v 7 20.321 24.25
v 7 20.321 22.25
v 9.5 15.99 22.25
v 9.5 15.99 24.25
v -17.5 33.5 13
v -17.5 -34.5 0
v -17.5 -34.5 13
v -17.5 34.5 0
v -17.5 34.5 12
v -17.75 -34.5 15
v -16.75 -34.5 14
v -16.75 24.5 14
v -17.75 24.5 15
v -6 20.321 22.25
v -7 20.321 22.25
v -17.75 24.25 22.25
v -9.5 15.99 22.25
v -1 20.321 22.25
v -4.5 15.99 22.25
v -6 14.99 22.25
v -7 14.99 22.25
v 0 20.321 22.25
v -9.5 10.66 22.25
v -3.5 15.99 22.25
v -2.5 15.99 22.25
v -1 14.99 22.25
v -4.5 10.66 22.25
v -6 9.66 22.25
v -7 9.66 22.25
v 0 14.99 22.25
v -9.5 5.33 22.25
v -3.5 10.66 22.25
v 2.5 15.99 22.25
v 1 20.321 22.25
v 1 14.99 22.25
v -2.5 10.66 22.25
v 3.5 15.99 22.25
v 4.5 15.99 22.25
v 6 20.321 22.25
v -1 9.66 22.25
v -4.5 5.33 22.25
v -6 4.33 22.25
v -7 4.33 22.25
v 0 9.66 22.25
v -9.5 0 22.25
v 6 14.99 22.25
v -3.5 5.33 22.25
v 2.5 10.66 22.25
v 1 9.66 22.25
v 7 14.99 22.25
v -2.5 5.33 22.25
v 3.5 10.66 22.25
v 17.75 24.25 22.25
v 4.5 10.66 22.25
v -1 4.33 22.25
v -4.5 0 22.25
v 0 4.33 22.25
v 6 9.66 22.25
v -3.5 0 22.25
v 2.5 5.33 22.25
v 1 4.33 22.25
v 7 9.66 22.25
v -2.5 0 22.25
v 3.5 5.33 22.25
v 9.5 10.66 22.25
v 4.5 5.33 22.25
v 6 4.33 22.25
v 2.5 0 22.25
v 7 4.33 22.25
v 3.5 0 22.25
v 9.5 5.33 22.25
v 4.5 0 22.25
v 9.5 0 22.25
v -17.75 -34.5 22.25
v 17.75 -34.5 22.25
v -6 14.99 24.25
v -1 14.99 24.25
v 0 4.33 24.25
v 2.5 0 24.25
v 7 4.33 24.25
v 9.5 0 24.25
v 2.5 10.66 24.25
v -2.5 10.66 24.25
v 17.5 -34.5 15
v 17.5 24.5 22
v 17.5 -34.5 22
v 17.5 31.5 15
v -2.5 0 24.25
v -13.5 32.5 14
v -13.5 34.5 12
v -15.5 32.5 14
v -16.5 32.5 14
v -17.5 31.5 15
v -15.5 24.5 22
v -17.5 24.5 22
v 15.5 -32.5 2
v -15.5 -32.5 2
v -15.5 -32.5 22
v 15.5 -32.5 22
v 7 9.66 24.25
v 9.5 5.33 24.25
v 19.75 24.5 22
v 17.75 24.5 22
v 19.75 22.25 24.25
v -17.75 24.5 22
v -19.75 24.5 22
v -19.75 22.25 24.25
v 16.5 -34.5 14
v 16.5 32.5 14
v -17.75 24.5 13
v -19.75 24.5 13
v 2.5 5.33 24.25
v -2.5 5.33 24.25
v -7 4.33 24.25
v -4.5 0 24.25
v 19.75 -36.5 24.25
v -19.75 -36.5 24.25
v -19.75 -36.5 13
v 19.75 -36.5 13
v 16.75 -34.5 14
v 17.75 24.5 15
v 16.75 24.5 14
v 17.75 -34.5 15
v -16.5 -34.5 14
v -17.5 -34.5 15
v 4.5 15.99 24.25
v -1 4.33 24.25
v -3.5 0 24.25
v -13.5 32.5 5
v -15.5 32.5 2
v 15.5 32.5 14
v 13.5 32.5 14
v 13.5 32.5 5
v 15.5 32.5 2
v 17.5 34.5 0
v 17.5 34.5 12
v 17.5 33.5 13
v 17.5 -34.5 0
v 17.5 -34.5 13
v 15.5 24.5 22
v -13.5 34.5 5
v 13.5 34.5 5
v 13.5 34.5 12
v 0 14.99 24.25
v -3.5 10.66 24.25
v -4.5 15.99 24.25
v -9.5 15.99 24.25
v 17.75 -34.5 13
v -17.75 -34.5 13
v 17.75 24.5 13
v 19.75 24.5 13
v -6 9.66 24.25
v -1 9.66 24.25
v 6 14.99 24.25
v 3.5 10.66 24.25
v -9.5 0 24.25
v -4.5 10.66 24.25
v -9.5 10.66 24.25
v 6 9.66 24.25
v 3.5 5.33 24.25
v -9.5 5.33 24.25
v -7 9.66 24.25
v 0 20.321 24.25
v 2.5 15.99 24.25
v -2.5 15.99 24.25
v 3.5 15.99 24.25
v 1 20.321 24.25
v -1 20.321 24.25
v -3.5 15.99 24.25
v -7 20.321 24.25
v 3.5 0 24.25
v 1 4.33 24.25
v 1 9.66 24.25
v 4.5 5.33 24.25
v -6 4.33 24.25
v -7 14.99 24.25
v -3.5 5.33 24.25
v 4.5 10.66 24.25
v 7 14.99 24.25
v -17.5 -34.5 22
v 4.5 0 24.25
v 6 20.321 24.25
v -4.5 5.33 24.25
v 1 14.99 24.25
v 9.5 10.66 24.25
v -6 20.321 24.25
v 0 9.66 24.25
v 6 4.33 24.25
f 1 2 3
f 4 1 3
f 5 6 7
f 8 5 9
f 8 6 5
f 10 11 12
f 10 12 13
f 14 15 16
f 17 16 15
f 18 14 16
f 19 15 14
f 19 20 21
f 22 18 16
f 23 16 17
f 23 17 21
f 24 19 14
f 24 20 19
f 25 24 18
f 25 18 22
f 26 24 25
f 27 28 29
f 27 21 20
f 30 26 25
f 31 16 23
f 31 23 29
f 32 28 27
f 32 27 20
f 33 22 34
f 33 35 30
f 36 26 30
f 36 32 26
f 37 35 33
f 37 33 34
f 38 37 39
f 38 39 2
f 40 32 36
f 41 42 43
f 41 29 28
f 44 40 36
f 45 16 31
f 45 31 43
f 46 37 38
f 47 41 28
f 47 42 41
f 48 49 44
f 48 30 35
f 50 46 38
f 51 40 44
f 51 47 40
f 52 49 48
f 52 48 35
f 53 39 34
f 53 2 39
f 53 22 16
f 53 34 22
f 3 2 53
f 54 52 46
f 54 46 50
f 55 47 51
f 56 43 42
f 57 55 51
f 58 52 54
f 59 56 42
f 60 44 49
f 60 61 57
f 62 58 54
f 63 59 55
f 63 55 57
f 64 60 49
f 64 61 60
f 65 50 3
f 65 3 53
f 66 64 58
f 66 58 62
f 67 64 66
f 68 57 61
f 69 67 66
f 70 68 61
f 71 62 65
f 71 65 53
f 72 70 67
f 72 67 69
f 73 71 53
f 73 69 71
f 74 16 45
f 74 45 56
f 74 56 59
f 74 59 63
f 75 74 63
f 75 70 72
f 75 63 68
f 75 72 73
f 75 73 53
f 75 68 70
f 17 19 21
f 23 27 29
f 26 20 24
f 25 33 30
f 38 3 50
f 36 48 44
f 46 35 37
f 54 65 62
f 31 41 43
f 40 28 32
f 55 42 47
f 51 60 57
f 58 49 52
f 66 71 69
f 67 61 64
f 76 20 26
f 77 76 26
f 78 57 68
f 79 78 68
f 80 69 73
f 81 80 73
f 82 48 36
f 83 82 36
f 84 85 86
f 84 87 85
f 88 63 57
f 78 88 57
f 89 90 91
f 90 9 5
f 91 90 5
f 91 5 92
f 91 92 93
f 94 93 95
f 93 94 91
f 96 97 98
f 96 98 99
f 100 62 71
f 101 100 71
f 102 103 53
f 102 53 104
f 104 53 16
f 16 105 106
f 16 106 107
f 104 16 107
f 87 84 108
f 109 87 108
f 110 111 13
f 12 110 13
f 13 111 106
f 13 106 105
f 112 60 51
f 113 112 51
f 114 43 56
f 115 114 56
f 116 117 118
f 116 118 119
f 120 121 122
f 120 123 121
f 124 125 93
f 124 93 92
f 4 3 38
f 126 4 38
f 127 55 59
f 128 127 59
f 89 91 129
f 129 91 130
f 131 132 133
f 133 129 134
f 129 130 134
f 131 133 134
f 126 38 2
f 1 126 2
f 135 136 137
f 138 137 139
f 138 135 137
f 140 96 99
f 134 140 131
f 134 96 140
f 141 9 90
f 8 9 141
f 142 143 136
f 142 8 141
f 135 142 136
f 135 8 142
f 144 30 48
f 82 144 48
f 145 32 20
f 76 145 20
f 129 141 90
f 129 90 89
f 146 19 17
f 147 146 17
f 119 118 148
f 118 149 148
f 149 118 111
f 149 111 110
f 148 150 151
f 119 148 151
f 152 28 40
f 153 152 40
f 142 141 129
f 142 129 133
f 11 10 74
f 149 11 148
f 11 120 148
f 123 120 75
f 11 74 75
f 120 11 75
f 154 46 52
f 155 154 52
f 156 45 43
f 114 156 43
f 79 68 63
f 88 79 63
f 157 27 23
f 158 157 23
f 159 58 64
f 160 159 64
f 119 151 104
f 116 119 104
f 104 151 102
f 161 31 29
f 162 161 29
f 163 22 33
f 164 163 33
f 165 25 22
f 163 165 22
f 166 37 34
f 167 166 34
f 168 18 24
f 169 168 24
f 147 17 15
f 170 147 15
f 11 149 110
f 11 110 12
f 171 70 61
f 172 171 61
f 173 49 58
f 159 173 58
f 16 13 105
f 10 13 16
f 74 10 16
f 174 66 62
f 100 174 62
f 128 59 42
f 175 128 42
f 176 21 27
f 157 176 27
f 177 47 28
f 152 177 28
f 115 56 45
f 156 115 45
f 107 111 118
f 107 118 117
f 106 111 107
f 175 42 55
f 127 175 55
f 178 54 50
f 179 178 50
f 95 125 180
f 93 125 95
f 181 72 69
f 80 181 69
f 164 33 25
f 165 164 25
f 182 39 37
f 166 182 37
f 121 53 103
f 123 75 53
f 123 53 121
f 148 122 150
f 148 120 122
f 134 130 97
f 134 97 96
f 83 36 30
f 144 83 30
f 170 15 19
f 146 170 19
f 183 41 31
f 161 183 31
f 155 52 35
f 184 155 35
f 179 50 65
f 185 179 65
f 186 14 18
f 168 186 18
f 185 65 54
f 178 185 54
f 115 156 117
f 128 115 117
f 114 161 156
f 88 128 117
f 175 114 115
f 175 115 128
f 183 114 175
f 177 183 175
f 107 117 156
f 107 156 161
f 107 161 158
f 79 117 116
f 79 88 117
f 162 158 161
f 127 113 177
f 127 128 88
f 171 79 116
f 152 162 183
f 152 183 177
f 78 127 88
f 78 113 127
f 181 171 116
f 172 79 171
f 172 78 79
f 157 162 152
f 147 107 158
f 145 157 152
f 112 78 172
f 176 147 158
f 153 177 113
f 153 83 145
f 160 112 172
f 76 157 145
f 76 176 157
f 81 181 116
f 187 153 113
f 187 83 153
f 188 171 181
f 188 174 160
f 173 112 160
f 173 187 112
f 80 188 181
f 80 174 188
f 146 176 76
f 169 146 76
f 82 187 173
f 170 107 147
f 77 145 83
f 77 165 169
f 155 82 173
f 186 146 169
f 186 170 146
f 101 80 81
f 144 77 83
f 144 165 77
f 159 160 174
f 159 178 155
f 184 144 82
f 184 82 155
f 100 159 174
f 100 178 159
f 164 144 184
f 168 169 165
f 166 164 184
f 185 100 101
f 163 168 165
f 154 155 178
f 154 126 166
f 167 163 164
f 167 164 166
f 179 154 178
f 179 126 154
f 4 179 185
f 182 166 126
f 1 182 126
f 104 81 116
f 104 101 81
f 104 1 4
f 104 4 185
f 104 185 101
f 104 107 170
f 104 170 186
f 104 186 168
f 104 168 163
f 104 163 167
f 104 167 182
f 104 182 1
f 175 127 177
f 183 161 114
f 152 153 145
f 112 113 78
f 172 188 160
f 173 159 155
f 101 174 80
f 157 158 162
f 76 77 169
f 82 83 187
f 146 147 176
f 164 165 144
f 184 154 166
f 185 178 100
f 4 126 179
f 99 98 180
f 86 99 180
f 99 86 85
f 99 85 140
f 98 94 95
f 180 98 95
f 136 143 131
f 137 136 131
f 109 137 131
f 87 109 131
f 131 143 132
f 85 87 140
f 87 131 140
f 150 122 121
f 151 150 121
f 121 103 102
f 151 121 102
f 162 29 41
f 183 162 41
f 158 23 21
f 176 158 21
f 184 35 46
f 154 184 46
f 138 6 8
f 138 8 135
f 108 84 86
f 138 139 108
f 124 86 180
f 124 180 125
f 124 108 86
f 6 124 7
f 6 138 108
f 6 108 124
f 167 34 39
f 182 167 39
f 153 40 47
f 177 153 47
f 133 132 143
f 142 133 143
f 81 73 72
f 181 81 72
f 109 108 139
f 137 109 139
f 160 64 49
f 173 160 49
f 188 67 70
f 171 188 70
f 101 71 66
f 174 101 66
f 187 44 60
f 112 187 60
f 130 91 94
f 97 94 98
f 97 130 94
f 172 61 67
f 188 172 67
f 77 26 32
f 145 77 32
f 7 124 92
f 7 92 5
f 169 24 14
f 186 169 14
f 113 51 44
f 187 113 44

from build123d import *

# Parameters (mm, degrees)
SKETCH_W          = 35
SKETCH_H          = 69
PAD_DEPTH         = 2
PAD001_DEPTH      = 20
SKETCH002_W       = 27
SKETCH002_H       = 2
PAD002_DEPTH      = 3
POCKET_DEPTH      = 35.001
POCKET001_DEPTH   = 69.001
PAD003_DEPTH      = 34.5
PAD003_DEPTH_BACK = 24.5
SKETCH006_W       = 39.5
SKETCH006_H       = 11.25
PAD004_DEPTH      = 2
POCKET002_DEPTH   = 39.501
POCKET003_DEPTH   = 2.001


with BuildPart() as body:
    # Sketch → Pad (new body)
    with BuildSketch(Plane.XY):
        Rectangle(SKETCH_W, SKETCH_H)
    extrude(amount=PAD_DEPTH)

    # Sketch001 (on Face6 of Pad) → Pad001 (join)
    with BuildSketch(Plane.XY.offset(2)):
        Polygon((-15.5, -32.5), (15.5, -32.5), (15.5, 32.5), (13.5, 32.5), (13.5, 34.5), (17.5, 34.5), (17.5, -34.5), (-17.5, -34.5), (-17.5, 34.5), (-13.5, 34.5), (-13.5, 32.5), (-15.5, 32.5), align=None)
    extrude(amount=PAD001_DEPTH)

    # Sketch002 (on Face6 of Pad001) → Pad002 (join)
    with BuildSketch(Plane.XY.offset(2)):
        with Locations((0, 33.5)):
            Rectangle(SKETCH002_W, SKETCH002_H)
    extrude(amount=PAD002_DEPTH)

    # Sketch003 (on Face9 of Pad002) → Pocket (cut, through all)
    with BuildSketch(Plane(origin=(-17.5, 0, 0), x_dir=(0, -1, 0), z_dir=(-1, 0, 0))):
        Polygon((-34.5, 22), (-34.5, 12), (-24.5, 22), align=None)
    extrude(amount=-POCKET_DEPTH, mode=Mode.SUBTRACT)

    # Sketch004 (on Face16 of Pocket) → Pocket001 (cut, through all)
    with BuildSketch(Plane.XZ.offset(34.5)):
        Polygon((-17.5, 15), (-16.5, 14), (-17.5, 13), align=None)
        Polygon((17.5, 15), (16.5, 14), (17.5, 13), align=None)
    extrude(amount=-POCKET001_DEPTH, mode=Mode.SUBTRACT)


with BuildPart() as lid:
    # Sketch005 → Pad003 (new body, two sides)
    with BuildSketch(Plane.XZ) as pad003_sk:
        Polygon((16.75, 14), (17.75, 13), (19.75, 13), (19.75, 24.25), (-19.75, 24.25), (-19.75, 13), (-17.75, 13), (-16.75, 14), (-17.75, 15), (-17.75, 22.25), (17.75, 22.25), (17.75, 15), align=None)
    extrude(amount=PAD003_DEPTH)
    extrude(pad003_sk.sketch, amount=-PAD003_DEPTH_BACK)

    # Sketch006 (on Face14 of Pad003) → Pad004 (join)
    with BuildSketch(Plane.XZ.offset(34.5)):
        with Locations((0, 18.625)):
            Rectangle(SKETCH006_W, SKETCH006_H)
    extrude(amount=PAD004_DEPTH)

    # Sketch007 (on Face10 of Pad004) → Pocket002 (cut, through all)
    with BuildSketch(Plane(origin=(-19.75, 0, 0), x_dir=(0, 0, -1), z_dir=(-1, 0, 0))):
        Polygon((-12, -34.5), (-24.25, -22.25), (-24.25, -34.5), align=None)
    extrude(amount=-POCKET002_DEPTH, mode=Mode.SUBTRACT)

    # Sketch008 (on Face10 of Pocket002) → Pocket003 (cut, through all)
    with BuildSketch(Plane(origin=(0, 0, 22.25), x_dir=(1, 0, 0), z_dir=(0, 0, -1))):
        Polygon((-9.5, 0), (-7, -4.330127), (-4.5, 0), align=None)
        Polygon((-2.5, 0), (0, -4.330127), (2.5, 0), align=None)
        Polygon((9.5, 0), (4.5, 0), (7, -4.330127), align=None)
        Polygon((-3.5, 0), (-6, -4.330127), (-1, -4.330127), align=None)
        Polygon((3.5, 0), (1, -4.330127), (6, -4.330127), align=None)
        Polygon((-9.5, -5.330127), (-7, -9.660254), (-4.5, -5.330127), align=None)
        Polygon((-2.5, -5.330127), (0, -9.660254), (2.5, -5.330127), align=None)
        Polygon((9.5, -5.330127), (4.5, -5.330127), (7, -9.660254), align=None)
        Polygon((-3.5, -5.330127), (-6, -9.660254), (-1, -9.660254), align=None)
        Polygon((3.5, -5.330127), (1, -9.660254), (6, -9.660254), align=None)
        Polygon((-9.5, -10.660254), (-7, -14.990381), (-4.5, -10.660254), align=None)
        Polygon((-2.5, -10.660254), (0, -14.990381), (2.5, -10.660254), align=None)
        Polygon((9.5, -10.660254), (4.5, -10.660254), (7, -14.990381), align=None)
        Polygon((-3.5, -10.660254), (-6, -14.990381), (-1, -14.990381), align=None)
        Polygon((3.5, -10.660254), (1, -14.990381), (6, -14.990381), align=None)
        Polygon((-9.5, -15.990381), (-7, -20.320508), (-4.5, -15.990381), align=None)
        Polygon((-2.5, -15.990381), (0, -20.320508), (2.5, -15.990381), align=None)
        Polygon((9.5, -15.990381), (4.5, -15.990381), (7, -20.320508), align=None)
        Polygon((-3.5, -15.990381), (-6, -20.320508), (-1, -20.320508), align=None)
        Polygon((3.5, -15.990381), (1, -20.320508), (6, -20.320508), align=None)
    extrude(amount=-POCKET003_DEPTH, mode=Mode.SUBTRACT)


solid = Compound([body.part, lid.part])
